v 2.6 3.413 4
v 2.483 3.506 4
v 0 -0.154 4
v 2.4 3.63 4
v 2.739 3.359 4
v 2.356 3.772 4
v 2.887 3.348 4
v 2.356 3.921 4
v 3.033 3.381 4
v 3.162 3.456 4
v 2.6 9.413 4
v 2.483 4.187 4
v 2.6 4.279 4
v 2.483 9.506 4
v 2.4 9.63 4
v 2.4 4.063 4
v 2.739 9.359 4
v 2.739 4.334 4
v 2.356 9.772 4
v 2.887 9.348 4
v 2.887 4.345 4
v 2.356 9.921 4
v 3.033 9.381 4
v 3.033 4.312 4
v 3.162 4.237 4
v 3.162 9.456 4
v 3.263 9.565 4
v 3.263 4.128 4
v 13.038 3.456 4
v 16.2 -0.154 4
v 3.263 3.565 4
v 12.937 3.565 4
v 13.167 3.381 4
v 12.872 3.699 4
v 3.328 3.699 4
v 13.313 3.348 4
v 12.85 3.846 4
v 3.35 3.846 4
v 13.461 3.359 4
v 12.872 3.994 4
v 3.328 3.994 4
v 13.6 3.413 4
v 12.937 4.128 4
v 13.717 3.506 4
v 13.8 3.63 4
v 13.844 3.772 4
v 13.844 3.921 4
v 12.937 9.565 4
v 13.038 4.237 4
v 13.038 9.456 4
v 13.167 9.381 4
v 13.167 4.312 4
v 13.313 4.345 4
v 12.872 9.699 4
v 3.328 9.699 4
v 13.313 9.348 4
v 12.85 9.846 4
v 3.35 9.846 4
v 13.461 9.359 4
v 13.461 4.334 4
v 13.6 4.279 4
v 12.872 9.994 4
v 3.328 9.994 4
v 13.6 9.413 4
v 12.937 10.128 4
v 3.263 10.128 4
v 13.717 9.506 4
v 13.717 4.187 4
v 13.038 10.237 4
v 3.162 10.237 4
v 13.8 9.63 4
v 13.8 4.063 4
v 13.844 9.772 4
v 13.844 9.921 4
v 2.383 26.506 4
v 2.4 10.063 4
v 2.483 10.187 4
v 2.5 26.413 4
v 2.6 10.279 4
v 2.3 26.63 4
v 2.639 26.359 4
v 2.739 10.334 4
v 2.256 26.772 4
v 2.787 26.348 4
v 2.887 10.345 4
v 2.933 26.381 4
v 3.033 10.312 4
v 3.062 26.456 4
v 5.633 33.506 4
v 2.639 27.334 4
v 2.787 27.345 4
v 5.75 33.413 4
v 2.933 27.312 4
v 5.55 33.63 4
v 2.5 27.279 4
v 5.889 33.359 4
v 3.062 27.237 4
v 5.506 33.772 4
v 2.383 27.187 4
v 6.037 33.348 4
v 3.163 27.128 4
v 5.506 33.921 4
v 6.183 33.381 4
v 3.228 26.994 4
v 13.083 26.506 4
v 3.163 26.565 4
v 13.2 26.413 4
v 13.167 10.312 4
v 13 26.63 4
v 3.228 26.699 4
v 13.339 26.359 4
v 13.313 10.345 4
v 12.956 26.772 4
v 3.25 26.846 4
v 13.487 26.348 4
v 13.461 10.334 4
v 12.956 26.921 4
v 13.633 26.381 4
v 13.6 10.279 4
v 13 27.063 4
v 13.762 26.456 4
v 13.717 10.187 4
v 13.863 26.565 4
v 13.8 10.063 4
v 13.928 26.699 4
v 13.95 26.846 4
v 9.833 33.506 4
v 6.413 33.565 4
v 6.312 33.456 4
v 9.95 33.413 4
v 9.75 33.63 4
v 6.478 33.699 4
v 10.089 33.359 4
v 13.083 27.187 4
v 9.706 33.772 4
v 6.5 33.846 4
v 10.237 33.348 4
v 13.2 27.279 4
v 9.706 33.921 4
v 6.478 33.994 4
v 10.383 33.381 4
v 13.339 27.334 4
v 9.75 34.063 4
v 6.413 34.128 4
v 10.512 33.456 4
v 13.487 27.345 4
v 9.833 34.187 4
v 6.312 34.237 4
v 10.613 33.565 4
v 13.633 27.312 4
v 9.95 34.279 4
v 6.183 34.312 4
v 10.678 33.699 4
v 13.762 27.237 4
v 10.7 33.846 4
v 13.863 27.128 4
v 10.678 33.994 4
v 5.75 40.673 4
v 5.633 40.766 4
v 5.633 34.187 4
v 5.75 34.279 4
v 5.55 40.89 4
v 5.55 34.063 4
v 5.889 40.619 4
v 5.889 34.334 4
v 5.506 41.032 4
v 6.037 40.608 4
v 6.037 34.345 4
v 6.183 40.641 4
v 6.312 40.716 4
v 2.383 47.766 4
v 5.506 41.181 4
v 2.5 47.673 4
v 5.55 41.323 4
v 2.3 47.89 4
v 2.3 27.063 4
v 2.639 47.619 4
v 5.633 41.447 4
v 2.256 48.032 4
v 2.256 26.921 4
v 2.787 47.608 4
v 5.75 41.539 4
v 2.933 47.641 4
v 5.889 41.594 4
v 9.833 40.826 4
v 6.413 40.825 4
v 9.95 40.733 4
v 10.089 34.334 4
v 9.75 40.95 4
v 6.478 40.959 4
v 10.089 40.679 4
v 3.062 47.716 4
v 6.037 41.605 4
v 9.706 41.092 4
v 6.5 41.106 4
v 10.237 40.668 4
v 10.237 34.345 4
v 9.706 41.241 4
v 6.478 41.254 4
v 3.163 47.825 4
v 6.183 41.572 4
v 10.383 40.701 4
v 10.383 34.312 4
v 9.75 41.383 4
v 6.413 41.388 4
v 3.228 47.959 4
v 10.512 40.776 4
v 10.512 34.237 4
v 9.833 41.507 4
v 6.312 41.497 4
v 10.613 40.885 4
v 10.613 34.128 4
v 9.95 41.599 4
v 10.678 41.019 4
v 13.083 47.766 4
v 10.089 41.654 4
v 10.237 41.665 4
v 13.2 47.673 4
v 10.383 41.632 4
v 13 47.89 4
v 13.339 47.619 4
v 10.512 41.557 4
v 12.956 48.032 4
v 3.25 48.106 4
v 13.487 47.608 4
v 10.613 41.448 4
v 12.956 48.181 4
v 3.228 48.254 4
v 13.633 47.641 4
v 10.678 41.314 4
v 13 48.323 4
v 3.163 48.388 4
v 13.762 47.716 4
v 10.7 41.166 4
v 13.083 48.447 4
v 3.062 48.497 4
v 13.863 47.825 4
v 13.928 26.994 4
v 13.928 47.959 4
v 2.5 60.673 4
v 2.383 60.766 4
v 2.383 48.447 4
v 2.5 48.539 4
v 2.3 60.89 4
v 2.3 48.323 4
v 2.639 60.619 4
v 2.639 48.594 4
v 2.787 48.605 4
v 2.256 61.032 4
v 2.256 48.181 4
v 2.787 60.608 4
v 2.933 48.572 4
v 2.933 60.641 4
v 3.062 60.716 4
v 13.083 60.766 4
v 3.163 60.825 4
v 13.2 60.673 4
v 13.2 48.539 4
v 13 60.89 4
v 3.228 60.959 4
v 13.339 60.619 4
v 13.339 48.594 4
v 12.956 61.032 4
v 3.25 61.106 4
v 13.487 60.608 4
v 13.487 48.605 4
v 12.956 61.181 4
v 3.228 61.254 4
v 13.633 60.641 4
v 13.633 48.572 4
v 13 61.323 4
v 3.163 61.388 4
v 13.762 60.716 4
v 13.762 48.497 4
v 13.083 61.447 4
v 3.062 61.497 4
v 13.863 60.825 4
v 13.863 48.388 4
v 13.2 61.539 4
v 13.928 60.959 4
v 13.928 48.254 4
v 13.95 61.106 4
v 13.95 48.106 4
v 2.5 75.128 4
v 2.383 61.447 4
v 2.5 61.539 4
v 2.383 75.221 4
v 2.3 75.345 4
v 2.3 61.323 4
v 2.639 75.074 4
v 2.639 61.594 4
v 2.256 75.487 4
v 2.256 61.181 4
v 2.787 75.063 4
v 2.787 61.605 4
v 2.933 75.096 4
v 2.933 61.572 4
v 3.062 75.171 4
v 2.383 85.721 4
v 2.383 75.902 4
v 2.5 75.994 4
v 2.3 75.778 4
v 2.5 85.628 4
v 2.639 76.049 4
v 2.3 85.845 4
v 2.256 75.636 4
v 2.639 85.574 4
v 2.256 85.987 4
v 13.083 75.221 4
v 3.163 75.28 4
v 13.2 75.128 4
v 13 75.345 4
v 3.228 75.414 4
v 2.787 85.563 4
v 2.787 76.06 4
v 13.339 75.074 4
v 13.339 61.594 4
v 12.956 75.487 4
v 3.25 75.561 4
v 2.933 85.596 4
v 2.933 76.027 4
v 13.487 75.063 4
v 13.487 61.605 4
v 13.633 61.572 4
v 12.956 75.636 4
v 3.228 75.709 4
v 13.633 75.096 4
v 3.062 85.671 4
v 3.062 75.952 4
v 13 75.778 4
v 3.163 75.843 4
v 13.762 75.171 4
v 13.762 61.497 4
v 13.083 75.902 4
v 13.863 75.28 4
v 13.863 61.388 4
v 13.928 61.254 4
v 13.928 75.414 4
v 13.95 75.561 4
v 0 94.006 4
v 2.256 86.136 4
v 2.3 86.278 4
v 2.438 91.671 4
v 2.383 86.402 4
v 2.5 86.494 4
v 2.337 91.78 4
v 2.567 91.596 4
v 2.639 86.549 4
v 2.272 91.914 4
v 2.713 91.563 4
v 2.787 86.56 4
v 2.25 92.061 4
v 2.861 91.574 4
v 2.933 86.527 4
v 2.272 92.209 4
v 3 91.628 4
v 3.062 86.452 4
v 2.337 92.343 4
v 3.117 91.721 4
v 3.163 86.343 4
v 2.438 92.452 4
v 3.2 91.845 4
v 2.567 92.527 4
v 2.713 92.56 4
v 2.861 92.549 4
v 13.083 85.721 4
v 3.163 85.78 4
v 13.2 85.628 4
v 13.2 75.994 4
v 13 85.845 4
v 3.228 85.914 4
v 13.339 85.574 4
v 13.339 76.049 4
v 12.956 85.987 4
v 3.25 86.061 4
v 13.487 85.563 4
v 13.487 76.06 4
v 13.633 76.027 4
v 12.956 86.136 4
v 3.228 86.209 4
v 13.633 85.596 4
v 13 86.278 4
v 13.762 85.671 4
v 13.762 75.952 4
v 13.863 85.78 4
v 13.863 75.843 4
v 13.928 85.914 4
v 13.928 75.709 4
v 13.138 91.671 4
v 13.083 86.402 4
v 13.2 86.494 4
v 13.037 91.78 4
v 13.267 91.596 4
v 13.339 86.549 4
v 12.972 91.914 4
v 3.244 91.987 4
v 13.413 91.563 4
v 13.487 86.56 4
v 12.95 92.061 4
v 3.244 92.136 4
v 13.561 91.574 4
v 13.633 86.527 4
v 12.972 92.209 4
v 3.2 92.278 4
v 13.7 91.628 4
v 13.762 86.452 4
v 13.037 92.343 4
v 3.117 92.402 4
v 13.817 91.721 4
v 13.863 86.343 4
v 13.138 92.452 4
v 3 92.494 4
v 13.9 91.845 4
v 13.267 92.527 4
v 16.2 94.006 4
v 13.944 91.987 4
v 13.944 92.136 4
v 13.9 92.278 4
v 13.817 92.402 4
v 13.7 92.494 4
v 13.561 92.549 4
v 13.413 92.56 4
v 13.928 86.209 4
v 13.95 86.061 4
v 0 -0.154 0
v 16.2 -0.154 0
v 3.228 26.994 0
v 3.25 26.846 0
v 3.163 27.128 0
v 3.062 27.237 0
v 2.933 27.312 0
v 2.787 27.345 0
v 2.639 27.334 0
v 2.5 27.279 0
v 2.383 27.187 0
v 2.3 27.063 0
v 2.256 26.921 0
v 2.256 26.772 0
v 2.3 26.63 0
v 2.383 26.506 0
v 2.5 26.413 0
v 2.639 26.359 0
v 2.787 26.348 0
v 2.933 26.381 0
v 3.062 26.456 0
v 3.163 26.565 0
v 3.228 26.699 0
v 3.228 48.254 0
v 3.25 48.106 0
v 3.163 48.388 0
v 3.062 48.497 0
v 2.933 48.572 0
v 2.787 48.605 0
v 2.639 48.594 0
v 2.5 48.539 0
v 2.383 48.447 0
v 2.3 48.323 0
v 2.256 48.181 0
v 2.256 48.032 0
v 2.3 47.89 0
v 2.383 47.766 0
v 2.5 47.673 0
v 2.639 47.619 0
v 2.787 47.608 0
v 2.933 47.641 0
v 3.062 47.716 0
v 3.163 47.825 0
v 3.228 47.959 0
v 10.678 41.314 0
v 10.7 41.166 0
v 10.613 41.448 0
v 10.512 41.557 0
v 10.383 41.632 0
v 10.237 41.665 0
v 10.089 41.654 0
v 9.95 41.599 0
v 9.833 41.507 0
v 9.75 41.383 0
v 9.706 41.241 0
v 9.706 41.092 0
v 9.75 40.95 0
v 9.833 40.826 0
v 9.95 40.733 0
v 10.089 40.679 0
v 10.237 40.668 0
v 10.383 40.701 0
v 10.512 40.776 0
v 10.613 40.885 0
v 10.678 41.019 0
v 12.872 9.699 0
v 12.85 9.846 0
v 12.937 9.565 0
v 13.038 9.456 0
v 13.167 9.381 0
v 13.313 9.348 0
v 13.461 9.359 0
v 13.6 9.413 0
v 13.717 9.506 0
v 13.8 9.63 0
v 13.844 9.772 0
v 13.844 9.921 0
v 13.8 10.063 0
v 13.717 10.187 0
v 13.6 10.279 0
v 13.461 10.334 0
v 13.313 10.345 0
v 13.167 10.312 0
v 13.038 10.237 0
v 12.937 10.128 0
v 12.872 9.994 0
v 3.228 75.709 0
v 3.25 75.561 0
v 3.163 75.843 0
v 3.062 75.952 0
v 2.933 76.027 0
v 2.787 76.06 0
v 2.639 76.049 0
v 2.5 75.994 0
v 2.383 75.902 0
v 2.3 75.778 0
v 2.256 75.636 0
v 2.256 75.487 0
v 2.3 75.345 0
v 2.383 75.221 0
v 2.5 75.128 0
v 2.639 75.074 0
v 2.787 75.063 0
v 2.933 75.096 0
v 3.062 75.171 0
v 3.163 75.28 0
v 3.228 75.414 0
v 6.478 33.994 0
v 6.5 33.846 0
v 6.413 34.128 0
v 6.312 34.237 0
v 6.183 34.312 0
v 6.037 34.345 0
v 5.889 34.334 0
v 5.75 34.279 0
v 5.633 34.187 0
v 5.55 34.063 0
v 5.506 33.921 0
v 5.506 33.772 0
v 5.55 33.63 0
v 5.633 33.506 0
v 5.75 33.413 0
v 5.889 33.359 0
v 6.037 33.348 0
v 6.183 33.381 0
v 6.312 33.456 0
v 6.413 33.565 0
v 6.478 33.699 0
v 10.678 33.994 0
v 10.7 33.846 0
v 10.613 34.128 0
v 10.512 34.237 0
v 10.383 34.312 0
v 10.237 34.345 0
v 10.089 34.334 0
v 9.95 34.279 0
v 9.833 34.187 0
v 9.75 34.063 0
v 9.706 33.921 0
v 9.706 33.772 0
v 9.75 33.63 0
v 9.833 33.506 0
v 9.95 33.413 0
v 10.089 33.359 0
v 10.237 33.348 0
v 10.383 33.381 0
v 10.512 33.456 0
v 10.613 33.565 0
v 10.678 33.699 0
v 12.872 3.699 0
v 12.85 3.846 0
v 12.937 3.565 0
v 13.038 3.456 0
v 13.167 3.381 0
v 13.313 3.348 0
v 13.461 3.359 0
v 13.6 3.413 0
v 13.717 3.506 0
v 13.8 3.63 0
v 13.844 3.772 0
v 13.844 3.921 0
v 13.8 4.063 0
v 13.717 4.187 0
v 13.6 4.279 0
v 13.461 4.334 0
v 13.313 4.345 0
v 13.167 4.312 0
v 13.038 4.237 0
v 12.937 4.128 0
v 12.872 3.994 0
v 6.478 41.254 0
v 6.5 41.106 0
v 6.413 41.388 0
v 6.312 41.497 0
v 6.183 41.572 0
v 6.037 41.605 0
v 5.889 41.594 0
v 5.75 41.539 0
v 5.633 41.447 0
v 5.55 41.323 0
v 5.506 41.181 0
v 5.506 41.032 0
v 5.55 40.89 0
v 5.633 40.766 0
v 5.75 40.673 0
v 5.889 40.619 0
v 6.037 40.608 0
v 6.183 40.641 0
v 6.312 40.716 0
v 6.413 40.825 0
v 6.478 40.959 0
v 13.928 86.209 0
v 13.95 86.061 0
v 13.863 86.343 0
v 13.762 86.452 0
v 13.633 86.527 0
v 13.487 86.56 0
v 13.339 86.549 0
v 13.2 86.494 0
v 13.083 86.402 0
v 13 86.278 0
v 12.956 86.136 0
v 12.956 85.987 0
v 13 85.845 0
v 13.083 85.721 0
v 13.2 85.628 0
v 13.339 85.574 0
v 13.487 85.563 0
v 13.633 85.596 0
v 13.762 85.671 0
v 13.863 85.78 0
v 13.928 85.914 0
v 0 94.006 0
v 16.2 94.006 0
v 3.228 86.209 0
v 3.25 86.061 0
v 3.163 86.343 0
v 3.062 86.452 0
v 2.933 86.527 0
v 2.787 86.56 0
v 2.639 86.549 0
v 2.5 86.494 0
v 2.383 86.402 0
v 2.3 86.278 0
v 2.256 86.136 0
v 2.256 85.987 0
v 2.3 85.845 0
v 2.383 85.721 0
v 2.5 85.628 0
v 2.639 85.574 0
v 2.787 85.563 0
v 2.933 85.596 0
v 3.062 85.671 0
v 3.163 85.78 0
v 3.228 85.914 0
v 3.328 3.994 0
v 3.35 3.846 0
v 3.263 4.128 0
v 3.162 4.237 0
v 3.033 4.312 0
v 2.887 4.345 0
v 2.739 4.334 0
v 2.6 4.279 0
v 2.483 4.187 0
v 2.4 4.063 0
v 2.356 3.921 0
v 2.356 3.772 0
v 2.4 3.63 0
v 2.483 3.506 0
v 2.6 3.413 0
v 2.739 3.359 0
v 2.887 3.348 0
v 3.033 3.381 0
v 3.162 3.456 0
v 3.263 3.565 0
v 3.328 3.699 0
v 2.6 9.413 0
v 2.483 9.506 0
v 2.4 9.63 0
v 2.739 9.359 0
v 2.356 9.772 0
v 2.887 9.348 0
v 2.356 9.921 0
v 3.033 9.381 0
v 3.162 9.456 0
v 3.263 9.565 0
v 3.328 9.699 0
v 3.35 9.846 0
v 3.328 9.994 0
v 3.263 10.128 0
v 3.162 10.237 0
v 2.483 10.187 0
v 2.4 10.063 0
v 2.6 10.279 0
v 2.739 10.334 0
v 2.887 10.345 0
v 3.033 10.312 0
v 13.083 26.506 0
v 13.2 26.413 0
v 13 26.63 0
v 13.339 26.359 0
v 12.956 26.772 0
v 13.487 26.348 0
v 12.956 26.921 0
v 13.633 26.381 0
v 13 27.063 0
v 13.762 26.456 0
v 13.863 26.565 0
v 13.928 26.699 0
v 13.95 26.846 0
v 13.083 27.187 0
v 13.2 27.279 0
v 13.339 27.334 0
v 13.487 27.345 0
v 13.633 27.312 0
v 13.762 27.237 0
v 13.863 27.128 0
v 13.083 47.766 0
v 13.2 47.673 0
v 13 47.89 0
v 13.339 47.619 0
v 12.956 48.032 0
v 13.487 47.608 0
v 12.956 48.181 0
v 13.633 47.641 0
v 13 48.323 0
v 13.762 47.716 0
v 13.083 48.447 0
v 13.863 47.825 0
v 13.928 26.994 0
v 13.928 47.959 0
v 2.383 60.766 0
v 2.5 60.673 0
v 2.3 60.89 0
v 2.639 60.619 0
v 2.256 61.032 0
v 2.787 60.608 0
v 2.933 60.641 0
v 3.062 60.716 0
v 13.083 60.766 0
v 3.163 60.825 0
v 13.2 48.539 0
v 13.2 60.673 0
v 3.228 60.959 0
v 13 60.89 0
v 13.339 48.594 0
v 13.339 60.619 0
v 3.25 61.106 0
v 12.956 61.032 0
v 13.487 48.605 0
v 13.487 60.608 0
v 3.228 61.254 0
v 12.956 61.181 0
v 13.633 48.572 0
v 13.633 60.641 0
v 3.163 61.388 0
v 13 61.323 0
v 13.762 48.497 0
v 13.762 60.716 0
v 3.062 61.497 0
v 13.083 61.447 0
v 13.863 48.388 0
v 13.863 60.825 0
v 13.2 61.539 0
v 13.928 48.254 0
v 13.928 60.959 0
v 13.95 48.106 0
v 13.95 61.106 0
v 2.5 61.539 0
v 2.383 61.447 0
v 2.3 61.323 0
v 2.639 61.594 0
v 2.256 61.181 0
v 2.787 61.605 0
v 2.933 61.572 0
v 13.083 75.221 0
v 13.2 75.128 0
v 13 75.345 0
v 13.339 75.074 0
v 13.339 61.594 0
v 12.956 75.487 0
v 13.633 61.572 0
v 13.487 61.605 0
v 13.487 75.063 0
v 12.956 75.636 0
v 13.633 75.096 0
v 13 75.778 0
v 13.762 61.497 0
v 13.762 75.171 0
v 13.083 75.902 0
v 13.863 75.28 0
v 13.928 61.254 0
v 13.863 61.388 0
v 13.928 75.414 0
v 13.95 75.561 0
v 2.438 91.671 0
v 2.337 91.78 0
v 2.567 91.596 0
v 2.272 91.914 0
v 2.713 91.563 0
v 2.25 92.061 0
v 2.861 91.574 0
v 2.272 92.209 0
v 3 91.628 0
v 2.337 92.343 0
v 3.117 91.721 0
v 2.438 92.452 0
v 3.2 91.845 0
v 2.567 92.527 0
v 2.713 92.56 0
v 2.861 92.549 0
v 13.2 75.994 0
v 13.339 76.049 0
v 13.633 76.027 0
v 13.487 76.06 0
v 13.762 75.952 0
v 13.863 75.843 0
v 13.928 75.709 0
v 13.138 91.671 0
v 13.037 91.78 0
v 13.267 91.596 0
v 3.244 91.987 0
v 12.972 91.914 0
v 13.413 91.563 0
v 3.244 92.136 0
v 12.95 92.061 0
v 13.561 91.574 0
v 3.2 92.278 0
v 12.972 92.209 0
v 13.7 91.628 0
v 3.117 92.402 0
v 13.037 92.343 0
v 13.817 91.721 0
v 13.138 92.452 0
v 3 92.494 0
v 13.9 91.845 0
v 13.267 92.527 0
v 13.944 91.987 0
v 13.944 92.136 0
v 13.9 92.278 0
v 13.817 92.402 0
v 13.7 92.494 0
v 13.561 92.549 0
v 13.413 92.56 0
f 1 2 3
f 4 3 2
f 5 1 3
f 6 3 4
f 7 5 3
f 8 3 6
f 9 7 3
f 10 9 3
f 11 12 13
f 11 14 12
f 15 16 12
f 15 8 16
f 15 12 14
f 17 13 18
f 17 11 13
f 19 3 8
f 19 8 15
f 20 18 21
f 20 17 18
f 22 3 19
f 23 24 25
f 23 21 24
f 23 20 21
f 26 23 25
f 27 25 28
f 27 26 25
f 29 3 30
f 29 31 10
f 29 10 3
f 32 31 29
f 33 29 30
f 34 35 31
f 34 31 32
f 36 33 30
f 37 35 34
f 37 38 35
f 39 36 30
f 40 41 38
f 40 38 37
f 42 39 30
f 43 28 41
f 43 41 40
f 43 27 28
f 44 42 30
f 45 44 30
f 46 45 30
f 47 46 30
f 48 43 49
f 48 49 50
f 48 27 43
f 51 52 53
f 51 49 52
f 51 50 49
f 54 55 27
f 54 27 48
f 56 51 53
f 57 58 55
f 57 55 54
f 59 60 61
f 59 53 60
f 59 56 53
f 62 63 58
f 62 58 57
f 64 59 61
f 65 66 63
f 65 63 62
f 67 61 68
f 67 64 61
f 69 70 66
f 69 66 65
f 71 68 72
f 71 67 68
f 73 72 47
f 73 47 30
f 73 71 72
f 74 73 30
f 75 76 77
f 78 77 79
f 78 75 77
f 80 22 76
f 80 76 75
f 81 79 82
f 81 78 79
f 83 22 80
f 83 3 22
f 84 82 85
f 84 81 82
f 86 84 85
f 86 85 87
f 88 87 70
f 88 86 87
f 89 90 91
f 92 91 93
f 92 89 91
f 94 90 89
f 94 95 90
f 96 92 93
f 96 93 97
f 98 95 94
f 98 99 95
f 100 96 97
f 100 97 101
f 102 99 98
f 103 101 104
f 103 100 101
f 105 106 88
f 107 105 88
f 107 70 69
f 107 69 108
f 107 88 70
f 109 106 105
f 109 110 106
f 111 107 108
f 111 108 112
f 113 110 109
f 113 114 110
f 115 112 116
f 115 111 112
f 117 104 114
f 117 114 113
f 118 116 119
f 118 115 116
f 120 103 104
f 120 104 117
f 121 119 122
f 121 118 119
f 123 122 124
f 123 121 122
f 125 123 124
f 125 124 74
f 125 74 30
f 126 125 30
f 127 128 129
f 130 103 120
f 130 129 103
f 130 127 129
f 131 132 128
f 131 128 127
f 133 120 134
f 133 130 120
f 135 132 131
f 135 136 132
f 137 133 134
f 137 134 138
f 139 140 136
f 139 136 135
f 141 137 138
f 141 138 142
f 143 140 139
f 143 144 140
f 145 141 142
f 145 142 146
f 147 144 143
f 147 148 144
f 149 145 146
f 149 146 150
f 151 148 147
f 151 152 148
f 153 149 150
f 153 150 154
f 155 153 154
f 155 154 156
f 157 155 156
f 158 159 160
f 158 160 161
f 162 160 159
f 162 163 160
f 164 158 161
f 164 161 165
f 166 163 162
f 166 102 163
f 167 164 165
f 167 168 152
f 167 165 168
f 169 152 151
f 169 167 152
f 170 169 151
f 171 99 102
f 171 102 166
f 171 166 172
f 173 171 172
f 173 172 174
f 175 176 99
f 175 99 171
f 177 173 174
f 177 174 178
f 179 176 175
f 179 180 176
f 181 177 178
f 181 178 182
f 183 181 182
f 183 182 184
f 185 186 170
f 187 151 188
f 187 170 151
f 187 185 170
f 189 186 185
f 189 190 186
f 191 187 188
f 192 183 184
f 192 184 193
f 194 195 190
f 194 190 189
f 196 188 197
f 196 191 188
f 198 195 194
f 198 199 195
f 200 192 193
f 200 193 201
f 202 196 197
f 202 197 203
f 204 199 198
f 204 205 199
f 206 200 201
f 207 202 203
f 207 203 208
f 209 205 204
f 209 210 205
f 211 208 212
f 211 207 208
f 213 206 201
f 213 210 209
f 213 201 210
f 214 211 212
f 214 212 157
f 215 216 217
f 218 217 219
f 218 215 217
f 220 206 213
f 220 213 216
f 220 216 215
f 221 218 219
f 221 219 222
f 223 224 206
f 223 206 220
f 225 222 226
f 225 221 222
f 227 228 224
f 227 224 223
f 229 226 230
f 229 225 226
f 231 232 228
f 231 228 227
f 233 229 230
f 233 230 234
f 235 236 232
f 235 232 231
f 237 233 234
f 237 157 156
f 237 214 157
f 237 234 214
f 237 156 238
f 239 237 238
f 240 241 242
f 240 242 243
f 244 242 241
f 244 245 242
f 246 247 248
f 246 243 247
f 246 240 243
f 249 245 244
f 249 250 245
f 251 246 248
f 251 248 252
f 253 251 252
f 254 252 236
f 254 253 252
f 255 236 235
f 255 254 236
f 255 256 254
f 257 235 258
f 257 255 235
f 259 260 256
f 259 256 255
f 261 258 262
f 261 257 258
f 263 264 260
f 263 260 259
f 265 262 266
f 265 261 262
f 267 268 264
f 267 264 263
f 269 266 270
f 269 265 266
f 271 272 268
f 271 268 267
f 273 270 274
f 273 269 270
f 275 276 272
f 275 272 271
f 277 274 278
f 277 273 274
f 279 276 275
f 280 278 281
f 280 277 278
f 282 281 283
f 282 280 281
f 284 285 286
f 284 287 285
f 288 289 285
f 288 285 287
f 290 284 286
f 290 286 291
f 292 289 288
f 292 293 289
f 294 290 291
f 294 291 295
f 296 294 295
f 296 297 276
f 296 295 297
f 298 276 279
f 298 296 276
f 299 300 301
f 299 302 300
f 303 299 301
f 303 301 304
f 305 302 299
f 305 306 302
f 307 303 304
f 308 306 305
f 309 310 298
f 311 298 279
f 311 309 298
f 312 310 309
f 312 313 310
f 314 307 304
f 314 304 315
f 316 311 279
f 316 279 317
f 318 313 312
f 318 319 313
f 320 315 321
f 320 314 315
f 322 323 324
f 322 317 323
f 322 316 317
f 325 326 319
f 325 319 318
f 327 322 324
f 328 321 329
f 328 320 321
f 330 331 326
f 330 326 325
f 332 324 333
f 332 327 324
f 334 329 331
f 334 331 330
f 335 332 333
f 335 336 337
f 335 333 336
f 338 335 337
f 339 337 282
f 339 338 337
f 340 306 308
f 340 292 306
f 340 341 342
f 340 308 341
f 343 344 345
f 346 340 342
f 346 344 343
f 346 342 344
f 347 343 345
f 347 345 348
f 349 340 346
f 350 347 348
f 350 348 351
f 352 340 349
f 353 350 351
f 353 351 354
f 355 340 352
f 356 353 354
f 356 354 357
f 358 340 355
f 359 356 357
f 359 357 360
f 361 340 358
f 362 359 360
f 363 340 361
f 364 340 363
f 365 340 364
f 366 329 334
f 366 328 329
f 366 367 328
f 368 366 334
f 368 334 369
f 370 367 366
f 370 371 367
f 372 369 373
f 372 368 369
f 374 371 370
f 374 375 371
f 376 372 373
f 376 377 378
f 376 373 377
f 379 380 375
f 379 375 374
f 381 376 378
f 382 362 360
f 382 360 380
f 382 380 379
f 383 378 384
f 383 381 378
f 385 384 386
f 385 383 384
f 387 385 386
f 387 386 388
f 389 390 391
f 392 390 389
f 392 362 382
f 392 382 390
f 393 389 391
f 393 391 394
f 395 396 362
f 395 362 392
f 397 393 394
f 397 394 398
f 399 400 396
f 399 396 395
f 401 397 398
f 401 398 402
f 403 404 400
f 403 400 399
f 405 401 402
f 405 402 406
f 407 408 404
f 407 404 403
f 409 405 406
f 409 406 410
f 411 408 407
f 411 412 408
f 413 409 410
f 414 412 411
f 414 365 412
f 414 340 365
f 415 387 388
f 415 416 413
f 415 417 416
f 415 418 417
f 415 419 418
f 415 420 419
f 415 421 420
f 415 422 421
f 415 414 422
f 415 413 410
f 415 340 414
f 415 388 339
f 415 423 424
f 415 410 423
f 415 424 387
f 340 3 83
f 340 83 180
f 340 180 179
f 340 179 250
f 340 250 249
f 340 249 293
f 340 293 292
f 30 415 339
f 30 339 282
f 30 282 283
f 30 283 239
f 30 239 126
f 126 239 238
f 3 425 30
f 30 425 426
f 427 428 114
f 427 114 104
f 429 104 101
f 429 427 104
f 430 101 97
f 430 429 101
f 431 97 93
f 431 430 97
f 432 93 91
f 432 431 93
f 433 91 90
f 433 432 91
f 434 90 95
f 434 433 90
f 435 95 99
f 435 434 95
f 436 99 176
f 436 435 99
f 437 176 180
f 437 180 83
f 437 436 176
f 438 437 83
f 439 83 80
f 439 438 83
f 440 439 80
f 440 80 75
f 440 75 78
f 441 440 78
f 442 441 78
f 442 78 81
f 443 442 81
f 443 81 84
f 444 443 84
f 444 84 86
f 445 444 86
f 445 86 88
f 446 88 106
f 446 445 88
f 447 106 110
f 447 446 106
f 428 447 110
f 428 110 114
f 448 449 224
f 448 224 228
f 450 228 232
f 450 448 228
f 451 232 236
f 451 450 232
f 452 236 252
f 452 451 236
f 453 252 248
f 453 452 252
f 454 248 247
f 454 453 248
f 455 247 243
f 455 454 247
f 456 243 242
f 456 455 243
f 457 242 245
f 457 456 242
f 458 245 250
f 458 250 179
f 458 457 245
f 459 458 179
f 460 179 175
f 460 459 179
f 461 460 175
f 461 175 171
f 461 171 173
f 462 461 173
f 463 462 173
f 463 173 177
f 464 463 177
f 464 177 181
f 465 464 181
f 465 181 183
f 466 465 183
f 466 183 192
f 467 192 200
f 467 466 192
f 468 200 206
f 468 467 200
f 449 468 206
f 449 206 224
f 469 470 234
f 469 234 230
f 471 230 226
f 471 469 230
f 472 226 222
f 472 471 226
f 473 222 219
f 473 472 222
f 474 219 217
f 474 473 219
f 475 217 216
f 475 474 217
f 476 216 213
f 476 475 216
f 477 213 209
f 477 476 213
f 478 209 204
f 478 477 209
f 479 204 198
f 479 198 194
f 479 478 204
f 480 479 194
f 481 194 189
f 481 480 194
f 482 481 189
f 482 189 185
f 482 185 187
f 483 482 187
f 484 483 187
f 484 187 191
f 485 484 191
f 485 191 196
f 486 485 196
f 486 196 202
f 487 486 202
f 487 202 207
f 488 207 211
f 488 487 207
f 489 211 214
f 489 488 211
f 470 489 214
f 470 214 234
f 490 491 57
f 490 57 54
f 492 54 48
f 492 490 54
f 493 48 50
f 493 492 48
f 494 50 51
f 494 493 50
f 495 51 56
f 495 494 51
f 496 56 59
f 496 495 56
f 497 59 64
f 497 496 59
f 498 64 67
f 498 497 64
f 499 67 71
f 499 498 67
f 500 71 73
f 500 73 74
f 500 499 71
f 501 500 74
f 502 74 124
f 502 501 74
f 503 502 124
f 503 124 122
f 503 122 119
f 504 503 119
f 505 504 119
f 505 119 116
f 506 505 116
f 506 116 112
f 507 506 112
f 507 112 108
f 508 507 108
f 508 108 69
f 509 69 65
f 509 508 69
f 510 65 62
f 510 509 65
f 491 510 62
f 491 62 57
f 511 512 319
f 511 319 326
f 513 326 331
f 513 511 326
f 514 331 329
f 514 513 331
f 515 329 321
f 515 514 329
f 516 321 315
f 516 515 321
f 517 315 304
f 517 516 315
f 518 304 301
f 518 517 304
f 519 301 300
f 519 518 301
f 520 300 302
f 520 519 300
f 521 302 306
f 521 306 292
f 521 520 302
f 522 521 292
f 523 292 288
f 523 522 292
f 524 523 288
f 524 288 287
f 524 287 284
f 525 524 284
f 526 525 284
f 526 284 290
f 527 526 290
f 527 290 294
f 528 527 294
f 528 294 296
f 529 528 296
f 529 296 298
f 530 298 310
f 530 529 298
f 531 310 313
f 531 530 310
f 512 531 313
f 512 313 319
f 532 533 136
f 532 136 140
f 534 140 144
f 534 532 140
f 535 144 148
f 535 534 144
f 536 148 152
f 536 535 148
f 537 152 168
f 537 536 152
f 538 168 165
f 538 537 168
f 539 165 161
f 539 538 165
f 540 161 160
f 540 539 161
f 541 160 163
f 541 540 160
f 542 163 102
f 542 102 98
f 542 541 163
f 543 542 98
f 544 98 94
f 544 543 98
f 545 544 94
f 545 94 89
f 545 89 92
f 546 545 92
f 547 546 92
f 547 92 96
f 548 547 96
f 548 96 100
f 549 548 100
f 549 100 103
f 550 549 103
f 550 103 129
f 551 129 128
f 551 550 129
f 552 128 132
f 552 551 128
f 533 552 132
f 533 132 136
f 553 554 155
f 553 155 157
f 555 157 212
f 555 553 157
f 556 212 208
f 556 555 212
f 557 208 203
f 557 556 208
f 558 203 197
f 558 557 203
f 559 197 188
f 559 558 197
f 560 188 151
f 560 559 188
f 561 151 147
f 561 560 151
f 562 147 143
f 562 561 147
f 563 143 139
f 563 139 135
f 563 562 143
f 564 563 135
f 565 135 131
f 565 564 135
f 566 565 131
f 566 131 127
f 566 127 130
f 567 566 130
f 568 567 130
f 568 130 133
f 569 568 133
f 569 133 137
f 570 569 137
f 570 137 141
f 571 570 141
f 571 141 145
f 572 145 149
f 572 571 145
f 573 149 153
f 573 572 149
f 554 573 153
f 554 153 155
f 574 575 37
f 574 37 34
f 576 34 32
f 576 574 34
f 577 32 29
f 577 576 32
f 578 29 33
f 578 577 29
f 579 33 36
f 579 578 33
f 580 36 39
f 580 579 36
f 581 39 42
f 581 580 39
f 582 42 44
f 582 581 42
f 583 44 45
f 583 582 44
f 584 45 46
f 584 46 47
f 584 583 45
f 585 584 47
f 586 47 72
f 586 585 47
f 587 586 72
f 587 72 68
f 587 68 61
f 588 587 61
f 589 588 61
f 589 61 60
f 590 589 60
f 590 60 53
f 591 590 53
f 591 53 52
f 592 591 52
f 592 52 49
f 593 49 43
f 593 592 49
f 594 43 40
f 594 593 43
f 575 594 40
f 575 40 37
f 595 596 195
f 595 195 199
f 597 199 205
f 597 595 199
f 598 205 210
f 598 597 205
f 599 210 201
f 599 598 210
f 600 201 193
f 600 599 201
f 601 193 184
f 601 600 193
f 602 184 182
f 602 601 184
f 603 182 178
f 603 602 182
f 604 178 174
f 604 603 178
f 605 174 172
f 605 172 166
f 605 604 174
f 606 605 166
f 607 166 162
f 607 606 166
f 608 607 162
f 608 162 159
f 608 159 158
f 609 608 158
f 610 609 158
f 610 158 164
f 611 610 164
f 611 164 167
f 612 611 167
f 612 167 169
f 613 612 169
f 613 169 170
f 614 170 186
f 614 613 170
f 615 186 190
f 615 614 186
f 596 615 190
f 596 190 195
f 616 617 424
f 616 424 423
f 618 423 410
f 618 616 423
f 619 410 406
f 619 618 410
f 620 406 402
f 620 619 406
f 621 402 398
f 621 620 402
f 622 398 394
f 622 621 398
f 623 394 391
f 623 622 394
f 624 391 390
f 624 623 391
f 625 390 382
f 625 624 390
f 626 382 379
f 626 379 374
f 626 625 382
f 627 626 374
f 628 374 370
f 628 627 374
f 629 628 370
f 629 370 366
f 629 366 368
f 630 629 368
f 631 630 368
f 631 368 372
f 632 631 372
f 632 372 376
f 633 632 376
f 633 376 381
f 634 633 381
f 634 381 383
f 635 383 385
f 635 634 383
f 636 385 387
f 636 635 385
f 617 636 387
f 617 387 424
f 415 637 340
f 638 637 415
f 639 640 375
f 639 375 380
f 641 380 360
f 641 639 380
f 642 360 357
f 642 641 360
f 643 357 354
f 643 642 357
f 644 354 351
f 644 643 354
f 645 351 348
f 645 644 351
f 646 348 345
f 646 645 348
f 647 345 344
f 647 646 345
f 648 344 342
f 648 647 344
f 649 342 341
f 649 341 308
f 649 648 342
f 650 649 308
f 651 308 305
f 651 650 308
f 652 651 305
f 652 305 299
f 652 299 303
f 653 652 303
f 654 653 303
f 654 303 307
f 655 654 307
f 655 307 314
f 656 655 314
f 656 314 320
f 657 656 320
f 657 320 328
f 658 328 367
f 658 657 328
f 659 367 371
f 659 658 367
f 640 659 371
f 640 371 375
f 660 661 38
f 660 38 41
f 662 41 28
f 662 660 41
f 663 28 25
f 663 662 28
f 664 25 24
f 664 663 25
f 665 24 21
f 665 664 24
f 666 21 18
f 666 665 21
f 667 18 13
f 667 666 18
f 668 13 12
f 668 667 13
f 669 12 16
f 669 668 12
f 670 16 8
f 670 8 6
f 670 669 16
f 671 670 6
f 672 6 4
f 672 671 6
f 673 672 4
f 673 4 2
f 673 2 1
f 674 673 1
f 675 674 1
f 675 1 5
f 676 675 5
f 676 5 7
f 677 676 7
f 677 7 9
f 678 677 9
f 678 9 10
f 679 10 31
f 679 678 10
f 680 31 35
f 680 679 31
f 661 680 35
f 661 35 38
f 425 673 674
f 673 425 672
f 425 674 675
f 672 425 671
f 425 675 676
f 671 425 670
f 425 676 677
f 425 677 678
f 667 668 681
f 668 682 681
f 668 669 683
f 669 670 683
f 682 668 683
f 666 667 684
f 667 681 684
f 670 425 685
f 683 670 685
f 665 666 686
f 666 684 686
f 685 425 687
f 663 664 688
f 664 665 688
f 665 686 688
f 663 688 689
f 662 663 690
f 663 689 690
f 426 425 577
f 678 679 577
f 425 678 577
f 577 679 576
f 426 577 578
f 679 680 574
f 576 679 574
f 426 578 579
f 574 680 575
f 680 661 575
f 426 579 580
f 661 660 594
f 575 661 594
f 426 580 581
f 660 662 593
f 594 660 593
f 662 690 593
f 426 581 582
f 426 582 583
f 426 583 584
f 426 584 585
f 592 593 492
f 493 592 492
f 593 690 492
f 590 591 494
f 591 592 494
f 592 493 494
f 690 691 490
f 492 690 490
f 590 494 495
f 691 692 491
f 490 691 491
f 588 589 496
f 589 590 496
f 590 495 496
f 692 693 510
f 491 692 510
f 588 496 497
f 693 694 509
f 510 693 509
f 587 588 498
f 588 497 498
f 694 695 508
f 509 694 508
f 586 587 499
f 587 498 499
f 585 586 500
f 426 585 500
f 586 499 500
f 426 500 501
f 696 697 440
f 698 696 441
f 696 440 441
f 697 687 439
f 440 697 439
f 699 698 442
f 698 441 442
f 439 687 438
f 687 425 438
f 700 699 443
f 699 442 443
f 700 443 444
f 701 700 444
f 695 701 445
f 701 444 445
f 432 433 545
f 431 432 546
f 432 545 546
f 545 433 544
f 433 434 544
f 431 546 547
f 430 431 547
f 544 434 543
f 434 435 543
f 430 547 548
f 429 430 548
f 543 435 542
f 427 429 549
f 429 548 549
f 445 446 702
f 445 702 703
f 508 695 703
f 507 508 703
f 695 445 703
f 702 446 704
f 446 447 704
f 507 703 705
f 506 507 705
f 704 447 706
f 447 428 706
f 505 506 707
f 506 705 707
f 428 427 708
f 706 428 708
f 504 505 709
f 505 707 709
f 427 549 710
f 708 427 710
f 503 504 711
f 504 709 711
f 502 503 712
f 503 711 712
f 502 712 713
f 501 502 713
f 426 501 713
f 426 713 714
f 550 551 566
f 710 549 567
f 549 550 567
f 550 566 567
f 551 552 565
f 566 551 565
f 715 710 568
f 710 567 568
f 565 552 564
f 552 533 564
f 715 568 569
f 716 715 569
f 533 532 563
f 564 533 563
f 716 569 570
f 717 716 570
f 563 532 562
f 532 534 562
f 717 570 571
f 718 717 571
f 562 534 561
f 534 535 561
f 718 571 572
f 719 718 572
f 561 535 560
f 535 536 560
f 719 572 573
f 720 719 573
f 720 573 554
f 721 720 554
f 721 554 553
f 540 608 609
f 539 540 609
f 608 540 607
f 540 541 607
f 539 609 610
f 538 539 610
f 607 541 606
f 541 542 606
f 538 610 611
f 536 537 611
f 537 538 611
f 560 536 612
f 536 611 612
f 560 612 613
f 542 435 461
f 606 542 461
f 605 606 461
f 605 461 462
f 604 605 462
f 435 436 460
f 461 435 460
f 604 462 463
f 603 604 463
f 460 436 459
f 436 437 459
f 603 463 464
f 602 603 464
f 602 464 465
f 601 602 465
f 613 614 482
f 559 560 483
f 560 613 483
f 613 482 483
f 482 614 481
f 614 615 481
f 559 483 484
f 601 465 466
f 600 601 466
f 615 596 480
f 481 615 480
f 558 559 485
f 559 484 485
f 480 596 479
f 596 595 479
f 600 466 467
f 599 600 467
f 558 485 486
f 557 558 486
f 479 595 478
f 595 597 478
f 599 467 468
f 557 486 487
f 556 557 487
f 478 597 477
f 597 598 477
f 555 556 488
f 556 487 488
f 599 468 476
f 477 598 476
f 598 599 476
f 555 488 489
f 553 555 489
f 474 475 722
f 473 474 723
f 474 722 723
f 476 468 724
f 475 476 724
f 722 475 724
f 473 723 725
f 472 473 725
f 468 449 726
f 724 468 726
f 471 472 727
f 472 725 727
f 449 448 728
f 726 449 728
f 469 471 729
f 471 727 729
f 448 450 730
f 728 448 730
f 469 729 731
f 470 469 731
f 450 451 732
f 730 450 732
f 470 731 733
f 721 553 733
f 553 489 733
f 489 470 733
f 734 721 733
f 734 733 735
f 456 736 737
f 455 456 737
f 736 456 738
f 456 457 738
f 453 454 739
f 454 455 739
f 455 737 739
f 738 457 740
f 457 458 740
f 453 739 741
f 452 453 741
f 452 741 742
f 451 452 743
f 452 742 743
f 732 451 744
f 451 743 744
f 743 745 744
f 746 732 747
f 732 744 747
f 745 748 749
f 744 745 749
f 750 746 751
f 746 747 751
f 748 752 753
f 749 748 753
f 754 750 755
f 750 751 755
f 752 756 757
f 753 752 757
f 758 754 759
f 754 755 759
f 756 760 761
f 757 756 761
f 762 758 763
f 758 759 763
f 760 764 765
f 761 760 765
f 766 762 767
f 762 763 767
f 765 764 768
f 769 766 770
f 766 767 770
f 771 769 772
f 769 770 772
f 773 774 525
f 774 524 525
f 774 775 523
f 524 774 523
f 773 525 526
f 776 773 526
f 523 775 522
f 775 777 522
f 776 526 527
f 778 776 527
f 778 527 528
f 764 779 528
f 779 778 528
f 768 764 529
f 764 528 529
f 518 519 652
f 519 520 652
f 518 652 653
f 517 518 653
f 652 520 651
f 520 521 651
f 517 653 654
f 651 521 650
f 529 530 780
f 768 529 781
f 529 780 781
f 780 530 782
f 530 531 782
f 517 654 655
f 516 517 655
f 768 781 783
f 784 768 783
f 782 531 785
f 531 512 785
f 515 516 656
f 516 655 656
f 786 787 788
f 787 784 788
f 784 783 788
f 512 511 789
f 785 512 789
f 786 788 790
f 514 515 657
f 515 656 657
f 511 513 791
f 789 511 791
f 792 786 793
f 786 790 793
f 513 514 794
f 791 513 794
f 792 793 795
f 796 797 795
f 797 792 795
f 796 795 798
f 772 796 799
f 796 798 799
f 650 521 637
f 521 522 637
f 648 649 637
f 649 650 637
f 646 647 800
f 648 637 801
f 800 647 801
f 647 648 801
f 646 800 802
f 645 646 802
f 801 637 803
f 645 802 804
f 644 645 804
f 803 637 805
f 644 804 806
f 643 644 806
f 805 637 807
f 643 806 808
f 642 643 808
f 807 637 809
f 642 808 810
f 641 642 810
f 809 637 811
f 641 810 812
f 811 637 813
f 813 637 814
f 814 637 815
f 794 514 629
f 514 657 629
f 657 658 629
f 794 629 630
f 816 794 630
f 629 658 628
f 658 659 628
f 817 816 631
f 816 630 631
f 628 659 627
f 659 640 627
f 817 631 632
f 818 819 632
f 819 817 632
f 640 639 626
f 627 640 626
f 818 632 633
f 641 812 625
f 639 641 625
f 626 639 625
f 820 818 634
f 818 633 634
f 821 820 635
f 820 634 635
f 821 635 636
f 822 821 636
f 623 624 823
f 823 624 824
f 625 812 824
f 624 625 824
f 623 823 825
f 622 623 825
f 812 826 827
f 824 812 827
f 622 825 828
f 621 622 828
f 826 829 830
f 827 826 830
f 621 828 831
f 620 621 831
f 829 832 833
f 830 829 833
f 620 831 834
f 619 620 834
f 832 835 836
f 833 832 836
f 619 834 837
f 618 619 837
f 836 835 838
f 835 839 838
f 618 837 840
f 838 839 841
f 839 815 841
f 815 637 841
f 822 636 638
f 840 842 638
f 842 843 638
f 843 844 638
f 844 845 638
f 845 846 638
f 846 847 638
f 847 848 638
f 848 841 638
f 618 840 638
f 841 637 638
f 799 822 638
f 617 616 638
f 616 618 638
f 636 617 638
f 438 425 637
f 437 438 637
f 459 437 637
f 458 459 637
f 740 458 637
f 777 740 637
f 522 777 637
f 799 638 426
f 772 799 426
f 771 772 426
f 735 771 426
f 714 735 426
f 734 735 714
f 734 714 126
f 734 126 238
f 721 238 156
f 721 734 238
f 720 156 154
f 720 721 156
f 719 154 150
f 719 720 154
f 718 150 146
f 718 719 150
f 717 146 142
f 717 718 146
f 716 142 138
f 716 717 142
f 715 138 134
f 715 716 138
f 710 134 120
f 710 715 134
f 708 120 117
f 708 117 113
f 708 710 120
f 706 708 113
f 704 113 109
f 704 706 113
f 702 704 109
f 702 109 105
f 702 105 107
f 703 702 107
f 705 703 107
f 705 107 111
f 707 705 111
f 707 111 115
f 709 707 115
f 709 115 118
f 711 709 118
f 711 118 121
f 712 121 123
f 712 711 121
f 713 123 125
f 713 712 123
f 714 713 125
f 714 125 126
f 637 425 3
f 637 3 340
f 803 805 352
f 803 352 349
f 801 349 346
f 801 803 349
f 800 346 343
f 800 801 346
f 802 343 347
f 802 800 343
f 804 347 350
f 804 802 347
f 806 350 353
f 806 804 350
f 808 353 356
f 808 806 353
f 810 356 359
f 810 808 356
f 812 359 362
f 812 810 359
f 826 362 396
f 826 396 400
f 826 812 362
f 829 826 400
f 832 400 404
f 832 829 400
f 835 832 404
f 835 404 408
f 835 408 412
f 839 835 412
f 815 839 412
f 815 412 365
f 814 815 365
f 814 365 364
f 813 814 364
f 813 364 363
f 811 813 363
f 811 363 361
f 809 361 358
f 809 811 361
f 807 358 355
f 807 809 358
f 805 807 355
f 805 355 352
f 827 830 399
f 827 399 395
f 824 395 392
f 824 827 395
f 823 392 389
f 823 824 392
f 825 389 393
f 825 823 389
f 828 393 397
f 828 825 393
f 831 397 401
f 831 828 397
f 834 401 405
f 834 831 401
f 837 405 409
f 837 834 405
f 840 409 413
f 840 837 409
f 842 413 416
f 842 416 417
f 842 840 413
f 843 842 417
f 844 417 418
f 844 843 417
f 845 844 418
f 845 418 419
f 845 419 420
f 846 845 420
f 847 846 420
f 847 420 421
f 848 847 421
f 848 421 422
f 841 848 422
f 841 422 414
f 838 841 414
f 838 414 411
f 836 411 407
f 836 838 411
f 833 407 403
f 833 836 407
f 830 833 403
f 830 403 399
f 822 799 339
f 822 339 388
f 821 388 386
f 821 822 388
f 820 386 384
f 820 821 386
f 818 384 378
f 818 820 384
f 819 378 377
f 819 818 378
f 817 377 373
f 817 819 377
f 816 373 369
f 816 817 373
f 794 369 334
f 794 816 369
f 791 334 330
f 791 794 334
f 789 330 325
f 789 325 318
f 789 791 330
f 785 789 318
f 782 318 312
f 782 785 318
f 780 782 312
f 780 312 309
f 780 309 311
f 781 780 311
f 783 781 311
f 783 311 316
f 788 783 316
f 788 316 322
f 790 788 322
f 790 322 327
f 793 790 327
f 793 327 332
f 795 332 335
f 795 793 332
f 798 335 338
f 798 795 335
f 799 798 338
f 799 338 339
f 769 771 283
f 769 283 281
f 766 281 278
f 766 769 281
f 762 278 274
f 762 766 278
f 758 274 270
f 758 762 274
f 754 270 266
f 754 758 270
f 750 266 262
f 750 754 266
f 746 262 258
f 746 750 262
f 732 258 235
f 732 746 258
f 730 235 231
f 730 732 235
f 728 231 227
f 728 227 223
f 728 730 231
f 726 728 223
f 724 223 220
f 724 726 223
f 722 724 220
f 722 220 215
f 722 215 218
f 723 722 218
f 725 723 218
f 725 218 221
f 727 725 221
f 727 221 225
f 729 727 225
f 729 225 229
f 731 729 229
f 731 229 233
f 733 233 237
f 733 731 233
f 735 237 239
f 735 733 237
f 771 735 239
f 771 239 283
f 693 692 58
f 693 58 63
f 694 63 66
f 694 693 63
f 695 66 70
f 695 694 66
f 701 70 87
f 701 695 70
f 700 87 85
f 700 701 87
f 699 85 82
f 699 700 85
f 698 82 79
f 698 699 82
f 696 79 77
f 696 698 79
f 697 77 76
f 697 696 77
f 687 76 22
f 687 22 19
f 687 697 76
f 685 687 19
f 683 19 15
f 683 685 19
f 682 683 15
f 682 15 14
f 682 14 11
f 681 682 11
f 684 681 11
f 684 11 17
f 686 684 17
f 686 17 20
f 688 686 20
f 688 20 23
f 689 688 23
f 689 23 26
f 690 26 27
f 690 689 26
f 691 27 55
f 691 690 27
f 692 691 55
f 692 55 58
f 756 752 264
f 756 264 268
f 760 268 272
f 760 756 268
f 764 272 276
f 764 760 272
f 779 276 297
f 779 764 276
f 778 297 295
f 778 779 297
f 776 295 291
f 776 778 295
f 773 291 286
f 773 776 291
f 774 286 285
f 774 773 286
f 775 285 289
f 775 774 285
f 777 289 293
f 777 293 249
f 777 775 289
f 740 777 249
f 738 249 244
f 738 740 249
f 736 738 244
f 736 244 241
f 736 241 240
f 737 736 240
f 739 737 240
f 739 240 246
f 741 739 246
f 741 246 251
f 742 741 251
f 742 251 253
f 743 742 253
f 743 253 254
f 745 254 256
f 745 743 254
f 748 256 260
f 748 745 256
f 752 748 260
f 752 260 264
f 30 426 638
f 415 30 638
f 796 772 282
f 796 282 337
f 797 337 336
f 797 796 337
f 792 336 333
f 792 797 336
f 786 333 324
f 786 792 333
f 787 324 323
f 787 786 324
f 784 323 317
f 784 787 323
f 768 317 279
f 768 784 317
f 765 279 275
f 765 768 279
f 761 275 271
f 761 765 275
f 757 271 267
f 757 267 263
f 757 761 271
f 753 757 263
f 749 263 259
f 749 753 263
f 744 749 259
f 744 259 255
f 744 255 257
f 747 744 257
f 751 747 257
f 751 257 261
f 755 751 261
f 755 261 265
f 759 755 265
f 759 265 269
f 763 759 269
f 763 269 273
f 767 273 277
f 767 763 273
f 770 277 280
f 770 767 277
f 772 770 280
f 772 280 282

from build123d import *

# Parameters (mm, degrees)
SKETCH3_W           = 16.2
SKETCH3_H           = 94.16
SKETCH3_R           = 0.5
BOSS_EXTRUDE3_DEPTH = 4


with BuildPart() as part:
    # Sketch3 → Boss-Extrude3 (new body)
    with BuildSketch(Plane.XY):
        with Locations((8.1, 46.926448831)):
            Rectangle(SKETCH3_W, SKETCH3_H)
        with Locations((6, 33.846448831)):
            Circle(SKETCH3_R, mode=Mode.SUBTRACT)
        with Locations((10.2, 33.846448831)):
            Circle(SKETCH3_R, mode=Mode.SUBTRACT)
        with Locations((2.75, 86.061448831)):
            Circle(SKETCH3_R, mode=Mode.SUBTRACT)
        with Locations((10.2, 41.166448831)):
            Circle(SKETCH3_R, mode=Mode.SUBTRACT)
        with Locations((13.45, 48.106448831)):
            Circle(SKETCH3_R, mode=Mode.SUBTRACT)
        with Locations((2.75, 92.061448831)):
            Circle(SKETCH3_R, mode=Mode.SUBTRACT)
        with Locations((13.45, 86.061448831)):
            Circle(SKETCH3_R, mode=Mode.SUBTRACT)
        with Locations((2.75, 61.106448831)):
            Circle(SKETCH3_R, mode=Mode.SUBTRACT)
        with Locations((2.85, 9.846448831)):
            Circle(SKETCH3_R, mode=Mode.SUBTRACT)
        with Locations((13.35, 9.846448831)):
            Circle(SKETCH3_R, mode=Mode.SUBTRACT)
        with Locations((13.35, 3.846448831)):
            Circle(SKETCH3_R, mode=Mode.SUBTRACT)
        with Locations((2.85, 3.846448831)):
            Circle(SKETCH3_R, mode=Mode.SUBTRACT)
        with Locations((13.45, 61.106448831)):
            Circle(SKETCH3_R, mode=Mode.SUBTRACT)
        with Locations((2.75, 75.561448831)):
            Circle(SKETCH3_R, mode=Mode.SUBTRACT)
        with Locations((13.45, 26.846448831)):
            Circle(SKETCH3_R, mode=Mode.SUBTRACT)
        with Locations((13.45, 75.561448831)):
            Circle(SKETCH3_R, mode=Mode.SUBTRACT)
        with Locations((13.45, 92.061448831)):
            Circle(SKETCH3_R, mode=Mode.SUBTRACT)
        with Locations((2.75, 26.846448831)):
            Circle(SKETCH3_R, mode=Mode.SUBTRACT)
        with Locations((6, 41.106448831)):
            Circle(SKETCH3_R, mode=Mode.SUBTRACT)
        with Locations((2.75, 48.106448831)):
            Circle(SKETCH3_R, mode=Mode.SUBTRACT)
    extrude(amount=BOSS_EXTRUDE3_DEPTH)


solid = part.part
